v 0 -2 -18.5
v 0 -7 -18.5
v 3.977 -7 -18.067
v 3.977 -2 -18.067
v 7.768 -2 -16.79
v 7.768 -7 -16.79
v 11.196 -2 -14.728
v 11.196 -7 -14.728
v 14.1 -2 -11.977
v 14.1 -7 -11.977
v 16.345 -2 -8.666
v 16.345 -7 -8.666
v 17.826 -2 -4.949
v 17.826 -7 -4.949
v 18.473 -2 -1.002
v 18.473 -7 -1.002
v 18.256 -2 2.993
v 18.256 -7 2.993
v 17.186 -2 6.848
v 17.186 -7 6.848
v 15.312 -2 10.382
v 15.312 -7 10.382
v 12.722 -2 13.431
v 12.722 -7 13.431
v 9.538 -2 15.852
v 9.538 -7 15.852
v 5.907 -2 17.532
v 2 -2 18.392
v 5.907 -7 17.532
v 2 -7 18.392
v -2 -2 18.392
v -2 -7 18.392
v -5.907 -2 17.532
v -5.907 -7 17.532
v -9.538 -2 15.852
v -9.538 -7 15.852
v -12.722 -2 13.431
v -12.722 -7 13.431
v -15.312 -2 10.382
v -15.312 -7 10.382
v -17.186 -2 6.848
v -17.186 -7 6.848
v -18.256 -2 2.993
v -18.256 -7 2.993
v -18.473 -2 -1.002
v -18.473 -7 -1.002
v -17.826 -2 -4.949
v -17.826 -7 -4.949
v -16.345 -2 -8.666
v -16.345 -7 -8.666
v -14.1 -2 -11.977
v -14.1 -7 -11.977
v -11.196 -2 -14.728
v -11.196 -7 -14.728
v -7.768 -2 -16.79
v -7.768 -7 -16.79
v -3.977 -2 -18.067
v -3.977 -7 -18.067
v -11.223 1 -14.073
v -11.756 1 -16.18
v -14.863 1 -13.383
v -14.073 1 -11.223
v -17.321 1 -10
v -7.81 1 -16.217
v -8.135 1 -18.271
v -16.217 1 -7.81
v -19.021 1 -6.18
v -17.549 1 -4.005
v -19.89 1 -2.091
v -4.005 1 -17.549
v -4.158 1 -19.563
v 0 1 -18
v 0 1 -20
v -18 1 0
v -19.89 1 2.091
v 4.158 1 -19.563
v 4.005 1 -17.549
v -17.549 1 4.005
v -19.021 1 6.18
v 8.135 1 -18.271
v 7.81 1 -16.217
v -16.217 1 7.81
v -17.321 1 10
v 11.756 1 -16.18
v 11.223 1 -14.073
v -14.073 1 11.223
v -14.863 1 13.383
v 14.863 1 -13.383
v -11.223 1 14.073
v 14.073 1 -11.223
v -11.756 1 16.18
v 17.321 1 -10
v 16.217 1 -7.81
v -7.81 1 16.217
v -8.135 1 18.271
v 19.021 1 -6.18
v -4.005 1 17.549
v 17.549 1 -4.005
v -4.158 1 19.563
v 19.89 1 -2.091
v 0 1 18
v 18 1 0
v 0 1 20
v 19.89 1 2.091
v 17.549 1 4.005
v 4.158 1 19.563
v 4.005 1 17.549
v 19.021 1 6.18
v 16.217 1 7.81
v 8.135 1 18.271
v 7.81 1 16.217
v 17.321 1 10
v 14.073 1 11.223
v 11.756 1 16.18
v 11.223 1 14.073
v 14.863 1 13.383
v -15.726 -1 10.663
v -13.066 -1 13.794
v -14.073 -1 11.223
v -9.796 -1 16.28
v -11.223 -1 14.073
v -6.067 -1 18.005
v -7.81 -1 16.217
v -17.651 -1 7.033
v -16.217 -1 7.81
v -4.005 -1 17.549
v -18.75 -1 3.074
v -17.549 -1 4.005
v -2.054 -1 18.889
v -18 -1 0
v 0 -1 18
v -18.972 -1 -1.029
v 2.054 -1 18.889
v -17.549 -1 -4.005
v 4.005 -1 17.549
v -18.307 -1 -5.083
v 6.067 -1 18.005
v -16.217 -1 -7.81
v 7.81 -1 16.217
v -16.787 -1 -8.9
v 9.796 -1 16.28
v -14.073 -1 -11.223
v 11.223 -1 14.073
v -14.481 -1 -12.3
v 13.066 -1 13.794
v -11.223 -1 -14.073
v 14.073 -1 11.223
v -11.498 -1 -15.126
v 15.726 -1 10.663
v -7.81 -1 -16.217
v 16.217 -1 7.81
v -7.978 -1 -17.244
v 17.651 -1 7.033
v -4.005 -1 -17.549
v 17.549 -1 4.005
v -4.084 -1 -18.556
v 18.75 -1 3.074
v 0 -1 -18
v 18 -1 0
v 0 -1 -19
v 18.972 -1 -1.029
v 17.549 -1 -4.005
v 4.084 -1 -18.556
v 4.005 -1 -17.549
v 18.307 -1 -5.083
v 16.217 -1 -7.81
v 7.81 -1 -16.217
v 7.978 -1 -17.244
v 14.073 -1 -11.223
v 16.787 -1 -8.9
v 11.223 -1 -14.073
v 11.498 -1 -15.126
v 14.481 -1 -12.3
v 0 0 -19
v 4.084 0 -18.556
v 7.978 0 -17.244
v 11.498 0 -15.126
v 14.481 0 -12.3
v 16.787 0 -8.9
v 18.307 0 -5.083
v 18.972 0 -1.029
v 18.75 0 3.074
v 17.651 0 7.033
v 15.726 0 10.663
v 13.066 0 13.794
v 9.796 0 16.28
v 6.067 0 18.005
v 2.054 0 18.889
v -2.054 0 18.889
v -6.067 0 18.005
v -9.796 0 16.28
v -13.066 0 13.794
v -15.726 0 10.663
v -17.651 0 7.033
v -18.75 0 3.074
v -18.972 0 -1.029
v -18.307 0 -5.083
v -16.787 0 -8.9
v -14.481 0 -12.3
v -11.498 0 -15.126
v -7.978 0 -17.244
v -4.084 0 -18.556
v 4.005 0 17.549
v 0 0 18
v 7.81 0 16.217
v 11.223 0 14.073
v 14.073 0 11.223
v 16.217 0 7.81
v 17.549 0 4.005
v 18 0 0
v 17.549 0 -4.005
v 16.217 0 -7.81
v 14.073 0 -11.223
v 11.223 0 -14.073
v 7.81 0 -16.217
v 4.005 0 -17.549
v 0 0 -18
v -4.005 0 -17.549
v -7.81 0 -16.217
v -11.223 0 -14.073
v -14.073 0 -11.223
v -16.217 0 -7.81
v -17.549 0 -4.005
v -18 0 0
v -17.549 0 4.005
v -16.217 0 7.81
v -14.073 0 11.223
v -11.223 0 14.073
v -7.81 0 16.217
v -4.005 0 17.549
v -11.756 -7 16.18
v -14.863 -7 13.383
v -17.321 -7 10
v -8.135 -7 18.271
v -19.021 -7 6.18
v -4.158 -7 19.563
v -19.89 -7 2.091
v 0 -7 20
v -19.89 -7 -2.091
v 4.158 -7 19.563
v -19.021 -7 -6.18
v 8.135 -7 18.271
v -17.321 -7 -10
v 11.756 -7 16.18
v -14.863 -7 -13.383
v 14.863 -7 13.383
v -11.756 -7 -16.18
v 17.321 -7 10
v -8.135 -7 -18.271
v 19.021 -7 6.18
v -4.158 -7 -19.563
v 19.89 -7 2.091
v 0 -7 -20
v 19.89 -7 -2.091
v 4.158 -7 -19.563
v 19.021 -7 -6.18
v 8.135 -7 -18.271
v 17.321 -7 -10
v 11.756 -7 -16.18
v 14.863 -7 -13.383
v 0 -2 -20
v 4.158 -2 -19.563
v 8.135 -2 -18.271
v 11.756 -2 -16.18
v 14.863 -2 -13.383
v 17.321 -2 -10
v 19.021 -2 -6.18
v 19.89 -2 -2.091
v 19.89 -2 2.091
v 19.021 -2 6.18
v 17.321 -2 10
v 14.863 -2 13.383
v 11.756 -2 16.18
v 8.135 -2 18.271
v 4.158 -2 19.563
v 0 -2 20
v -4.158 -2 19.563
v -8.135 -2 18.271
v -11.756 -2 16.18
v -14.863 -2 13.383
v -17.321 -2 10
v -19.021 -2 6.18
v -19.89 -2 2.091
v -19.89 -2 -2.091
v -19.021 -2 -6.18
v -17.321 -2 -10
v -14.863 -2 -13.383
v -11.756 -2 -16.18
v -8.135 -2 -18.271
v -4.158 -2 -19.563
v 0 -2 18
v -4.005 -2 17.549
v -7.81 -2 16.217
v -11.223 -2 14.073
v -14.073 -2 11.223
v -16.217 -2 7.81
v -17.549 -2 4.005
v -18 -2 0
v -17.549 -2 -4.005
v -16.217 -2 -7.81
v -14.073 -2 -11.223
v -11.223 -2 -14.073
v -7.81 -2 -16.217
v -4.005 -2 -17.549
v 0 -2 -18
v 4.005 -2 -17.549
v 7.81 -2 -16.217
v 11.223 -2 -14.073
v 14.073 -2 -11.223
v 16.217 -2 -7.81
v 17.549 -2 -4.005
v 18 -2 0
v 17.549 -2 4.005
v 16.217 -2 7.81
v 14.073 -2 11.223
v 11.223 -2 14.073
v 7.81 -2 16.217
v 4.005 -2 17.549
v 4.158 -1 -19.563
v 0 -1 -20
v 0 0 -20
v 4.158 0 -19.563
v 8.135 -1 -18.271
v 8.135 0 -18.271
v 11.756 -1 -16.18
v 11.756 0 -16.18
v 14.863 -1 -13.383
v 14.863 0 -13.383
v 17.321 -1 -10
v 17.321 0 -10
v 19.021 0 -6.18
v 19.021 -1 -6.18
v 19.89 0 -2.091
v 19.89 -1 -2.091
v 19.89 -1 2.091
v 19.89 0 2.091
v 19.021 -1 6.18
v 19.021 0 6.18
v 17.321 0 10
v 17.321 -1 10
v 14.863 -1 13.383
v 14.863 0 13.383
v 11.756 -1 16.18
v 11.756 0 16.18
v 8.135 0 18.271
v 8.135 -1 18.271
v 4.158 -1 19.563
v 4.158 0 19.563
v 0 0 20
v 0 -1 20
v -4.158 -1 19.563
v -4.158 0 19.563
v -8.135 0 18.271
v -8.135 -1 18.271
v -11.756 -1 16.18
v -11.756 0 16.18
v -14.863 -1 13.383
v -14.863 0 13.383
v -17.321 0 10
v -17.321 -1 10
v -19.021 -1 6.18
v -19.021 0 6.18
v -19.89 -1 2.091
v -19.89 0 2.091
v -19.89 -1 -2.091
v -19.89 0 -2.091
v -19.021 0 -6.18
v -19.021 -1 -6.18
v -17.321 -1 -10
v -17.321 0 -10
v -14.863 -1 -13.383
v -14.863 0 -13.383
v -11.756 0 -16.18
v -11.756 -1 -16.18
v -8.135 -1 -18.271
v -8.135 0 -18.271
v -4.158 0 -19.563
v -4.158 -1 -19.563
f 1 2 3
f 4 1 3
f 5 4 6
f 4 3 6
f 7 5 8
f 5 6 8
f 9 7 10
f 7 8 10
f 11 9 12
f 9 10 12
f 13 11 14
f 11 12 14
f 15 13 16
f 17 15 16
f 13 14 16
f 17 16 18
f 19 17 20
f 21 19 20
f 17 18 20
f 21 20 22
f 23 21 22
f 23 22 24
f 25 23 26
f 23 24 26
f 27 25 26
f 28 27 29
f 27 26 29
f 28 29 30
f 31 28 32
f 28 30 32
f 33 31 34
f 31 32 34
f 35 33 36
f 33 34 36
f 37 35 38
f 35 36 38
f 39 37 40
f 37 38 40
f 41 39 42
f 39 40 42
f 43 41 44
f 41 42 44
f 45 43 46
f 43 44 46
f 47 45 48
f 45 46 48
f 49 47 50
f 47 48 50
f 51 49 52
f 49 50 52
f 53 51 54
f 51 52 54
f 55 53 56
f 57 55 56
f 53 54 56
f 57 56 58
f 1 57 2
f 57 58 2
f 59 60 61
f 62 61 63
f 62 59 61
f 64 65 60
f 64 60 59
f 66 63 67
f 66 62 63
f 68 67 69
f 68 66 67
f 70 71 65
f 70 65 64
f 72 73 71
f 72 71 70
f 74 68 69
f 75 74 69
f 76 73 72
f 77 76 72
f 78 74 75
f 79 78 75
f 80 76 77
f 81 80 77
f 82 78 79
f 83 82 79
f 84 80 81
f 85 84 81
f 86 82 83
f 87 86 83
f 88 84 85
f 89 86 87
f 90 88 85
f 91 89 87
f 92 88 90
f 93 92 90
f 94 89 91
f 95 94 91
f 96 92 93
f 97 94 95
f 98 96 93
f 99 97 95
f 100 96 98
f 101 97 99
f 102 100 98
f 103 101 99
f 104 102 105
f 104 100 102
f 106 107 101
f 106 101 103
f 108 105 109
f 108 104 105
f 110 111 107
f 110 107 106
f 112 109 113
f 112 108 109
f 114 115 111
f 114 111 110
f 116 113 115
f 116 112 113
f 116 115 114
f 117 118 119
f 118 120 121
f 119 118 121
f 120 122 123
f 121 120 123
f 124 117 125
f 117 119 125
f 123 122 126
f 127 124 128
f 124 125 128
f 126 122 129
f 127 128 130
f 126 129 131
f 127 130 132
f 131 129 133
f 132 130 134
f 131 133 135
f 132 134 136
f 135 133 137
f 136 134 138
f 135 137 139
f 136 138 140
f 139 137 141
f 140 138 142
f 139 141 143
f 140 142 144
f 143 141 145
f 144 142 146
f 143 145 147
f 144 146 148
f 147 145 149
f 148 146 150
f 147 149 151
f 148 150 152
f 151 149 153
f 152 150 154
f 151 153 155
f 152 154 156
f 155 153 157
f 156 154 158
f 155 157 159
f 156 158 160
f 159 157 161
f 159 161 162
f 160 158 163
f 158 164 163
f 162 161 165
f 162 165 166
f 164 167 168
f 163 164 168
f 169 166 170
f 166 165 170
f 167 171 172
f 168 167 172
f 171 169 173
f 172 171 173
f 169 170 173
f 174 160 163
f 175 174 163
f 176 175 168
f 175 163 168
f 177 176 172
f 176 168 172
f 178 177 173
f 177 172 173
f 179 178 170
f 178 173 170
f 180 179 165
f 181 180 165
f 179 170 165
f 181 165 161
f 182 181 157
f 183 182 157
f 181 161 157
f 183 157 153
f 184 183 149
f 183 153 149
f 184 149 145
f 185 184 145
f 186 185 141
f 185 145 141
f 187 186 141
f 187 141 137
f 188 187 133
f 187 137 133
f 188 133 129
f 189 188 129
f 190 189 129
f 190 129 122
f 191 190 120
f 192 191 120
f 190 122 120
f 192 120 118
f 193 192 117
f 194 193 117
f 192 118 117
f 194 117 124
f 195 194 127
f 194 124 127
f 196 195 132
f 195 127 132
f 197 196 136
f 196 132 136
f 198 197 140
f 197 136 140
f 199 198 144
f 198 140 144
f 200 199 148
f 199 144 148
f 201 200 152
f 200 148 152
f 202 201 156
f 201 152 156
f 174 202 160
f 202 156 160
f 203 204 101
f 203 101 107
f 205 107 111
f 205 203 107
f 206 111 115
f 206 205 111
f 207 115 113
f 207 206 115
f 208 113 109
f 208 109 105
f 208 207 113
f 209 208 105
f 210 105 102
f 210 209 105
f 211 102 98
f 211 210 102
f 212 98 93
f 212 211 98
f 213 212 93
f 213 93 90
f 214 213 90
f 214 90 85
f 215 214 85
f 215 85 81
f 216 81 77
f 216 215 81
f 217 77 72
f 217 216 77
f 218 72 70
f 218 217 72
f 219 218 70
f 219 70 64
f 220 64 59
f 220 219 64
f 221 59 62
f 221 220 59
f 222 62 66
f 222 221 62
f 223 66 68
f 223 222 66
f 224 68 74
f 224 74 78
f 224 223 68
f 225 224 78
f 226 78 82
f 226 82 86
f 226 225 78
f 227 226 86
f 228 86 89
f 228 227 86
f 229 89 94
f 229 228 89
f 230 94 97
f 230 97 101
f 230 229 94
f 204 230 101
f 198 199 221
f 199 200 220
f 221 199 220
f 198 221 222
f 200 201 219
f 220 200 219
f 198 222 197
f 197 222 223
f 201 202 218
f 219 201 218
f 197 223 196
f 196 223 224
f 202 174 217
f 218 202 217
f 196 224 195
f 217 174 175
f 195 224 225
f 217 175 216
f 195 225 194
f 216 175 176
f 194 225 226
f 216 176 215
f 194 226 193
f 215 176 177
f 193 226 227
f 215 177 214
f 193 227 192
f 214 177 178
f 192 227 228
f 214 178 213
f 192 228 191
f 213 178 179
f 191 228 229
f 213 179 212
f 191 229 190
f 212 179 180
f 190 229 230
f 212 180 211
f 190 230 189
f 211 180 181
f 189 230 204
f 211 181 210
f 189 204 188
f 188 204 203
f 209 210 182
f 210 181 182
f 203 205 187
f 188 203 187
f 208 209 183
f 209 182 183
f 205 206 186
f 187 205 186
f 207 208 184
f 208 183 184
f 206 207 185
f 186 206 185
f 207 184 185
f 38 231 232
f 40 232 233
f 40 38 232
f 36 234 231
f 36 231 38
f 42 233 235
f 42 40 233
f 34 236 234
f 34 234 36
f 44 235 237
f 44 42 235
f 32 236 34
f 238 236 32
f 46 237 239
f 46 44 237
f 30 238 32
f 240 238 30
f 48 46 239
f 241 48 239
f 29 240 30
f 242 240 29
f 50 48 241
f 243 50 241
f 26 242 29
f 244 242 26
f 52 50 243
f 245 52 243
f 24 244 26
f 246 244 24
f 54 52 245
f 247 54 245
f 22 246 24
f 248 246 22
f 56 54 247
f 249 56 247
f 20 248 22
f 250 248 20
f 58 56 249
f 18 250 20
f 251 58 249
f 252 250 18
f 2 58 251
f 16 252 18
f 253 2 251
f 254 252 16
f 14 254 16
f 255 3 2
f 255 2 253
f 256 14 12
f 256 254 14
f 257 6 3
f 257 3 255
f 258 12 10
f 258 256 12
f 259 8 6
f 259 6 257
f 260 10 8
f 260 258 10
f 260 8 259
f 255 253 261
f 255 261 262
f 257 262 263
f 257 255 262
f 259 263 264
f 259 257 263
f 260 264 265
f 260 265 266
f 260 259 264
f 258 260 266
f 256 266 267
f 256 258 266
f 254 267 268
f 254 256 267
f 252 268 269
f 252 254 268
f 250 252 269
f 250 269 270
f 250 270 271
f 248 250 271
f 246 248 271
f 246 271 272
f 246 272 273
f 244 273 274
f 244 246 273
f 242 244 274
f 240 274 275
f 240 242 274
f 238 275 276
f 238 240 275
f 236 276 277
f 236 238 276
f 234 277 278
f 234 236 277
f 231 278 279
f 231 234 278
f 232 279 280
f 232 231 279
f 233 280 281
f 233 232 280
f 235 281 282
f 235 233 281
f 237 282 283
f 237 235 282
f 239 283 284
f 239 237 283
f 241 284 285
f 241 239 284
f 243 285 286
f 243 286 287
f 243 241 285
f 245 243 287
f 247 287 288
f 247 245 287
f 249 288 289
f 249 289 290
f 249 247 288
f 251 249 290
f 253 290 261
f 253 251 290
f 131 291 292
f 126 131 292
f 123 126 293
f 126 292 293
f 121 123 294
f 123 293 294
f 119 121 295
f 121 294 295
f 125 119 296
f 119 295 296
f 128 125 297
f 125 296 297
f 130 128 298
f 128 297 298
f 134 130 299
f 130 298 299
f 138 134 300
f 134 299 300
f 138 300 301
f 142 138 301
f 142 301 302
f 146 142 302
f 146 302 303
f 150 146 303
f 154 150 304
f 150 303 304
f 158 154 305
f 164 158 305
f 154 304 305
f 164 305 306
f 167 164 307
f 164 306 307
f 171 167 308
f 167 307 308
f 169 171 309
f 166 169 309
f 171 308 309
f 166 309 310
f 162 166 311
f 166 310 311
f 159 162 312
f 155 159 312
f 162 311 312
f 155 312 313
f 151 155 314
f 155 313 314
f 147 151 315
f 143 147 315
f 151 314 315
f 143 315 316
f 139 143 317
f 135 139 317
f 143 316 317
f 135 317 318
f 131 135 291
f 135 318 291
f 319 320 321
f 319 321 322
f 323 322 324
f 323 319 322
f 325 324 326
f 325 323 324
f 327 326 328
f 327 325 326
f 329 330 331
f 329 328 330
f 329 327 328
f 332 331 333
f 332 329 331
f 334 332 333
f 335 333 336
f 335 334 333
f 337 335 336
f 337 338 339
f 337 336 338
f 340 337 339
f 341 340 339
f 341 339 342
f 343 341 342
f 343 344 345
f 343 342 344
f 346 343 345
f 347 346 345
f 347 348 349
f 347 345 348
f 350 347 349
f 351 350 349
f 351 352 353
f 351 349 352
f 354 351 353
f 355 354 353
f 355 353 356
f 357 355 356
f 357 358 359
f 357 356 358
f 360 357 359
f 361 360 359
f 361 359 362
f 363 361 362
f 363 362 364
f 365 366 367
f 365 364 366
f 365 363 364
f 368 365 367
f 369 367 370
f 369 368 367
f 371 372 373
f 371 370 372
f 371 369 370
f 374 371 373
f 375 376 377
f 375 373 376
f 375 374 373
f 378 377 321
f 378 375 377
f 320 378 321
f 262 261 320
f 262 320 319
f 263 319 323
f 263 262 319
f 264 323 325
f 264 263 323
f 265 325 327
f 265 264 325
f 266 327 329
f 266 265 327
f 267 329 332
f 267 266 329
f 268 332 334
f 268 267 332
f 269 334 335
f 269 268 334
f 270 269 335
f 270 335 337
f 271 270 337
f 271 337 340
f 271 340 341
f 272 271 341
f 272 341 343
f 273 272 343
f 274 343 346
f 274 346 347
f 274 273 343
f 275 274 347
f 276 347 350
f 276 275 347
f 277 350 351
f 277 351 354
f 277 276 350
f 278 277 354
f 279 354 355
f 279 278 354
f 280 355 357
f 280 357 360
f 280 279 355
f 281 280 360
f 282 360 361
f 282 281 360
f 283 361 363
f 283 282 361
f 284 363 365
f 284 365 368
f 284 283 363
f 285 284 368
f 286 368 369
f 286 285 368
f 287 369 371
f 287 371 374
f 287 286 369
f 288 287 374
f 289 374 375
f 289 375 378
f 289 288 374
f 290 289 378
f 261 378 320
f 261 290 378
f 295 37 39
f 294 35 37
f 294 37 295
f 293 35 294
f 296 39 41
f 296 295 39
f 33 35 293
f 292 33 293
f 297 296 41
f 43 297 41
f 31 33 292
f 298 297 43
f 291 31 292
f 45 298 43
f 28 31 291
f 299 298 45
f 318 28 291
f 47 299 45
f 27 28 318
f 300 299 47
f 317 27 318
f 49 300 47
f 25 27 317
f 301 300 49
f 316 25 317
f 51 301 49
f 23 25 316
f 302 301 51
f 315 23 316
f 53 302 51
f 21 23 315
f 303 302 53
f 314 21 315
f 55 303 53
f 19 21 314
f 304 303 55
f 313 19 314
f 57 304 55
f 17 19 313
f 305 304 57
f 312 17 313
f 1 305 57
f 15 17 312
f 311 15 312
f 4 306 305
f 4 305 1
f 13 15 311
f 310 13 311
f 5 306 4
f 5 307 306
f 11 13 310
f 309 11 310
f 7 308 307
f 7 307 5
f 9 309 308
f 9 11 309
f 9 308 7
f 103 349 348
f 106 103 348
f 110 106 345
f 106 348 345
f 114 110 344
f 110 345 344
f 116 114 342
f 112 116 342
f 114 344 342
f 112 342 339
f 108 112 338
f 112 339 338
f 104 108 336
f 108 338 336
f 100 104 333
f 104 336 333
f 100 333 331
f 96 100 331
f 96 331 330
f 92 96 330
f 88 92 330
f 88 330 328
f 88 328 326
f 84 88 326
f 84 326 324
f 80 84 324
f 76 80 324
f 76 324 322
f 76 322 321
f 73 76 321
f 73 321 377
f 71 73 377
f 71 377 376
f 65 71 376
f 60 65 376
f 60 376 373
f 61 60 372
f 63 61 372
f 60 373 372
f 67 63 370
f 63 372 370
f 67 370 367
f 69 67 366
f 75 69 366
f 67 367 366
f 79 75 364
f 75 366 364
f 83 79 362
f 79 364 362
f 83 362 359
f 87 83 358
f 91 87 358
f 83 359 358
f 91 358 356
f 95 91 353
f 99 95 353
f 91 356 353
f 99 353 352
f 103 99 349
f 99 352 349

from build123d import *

# Parameters (mm, degrees)
SKETCH1_R           = 20
SKETCH1_R_2         = 18
BOSS_EXTRUDE1_DEPTH = 1
BOSS_EXTRUDE2_START = 1
SKETCH2_R           = 20
SKETCH2_R_2         = 19
BOSS_EXTRUDE2_DEPTH = 1
BOSS_EXTRUDE3_START = 1
SKETCH3_R           = 20
SKETCH3_R_2         = 18
BOSS_EXTRUDE3_DEPTH = 1
BOSS_EXTRUDE4_START = 5
SKETCH4_R           = 20
SKETCH4_R_2         = 18.5
BOSS_EXTRUDE4_DEPTH = 5


with BuildPart() as part:
    # Sketch1 → Boss-Extrude1 (new body)
    with BuildSketch(Plane(origin=(0, 0, 0), x_dir=(1, 0, 0), z_dir=(0, 1, 0))):
        with Locations(Location((0, 0, 0), (0, 0, 270))):
            Circle(SKETCH1_R)
        with Locations(Location((0, 0, 0), (0, 0, 270))):
            Circle(SKETCH1_R_2, mode=Mode.SUBTRACT)
    extrude(amount=BOSS_EXTRUDE1_DEPTH)

    # Sketch2 → Boss-Extrude2 (add)
    with BuildSketch(Plane.XZ.offset(BOSS_EXTRUDE2_START)):
        with Locations(Location((0, 0, 0), (0, 0, 270))):
            Circle(SKETCH2_R)
        with Locations(Location((0, 0, 0), (0, 0, 270))):
            Circle(SKETCH2_R_2, mode=Mode.SUBTRACT)
    extrude(amount=-BOSS_EXTRUDE2_DEPTH)

    # Sketch3 → Boss-Extrude3 (add)
    with BuildSketch(Plane.XZ.offset(1).offset(BOSS_EXTRUDE3_START)):
        with Locations(Location((0, 0, 0), (0, 0, 270))):
            Circle(SKETCH3_R)
        with Locations(Location((0, 0, 0), (0, 0, 90))):
            Circle(SKETCH3_R_2, mode=Mode.SUBTRACT)
    extrude(amount=-BOSS_EXTRUDE3_DEPTH)

    # Sketch4 → Boss-Extrude4 (add)
    with BuildSketch(Plane.XZ.offset(2).offset(BOSS_EXTRUDE4_START)):
        with Locations(Location((0, 0, 0), (0, 0, 270))):
            Circle(SKETCH4_R)
        with Locations(Location((0, 0, 0), (0, 0, 270))):
            Circle(SKETCH4_R_2, mode=Mode.SUBTRACT)
    extrude(amount=-BOSS_EXTRUDE4_DEPTH)


solid = part.part
